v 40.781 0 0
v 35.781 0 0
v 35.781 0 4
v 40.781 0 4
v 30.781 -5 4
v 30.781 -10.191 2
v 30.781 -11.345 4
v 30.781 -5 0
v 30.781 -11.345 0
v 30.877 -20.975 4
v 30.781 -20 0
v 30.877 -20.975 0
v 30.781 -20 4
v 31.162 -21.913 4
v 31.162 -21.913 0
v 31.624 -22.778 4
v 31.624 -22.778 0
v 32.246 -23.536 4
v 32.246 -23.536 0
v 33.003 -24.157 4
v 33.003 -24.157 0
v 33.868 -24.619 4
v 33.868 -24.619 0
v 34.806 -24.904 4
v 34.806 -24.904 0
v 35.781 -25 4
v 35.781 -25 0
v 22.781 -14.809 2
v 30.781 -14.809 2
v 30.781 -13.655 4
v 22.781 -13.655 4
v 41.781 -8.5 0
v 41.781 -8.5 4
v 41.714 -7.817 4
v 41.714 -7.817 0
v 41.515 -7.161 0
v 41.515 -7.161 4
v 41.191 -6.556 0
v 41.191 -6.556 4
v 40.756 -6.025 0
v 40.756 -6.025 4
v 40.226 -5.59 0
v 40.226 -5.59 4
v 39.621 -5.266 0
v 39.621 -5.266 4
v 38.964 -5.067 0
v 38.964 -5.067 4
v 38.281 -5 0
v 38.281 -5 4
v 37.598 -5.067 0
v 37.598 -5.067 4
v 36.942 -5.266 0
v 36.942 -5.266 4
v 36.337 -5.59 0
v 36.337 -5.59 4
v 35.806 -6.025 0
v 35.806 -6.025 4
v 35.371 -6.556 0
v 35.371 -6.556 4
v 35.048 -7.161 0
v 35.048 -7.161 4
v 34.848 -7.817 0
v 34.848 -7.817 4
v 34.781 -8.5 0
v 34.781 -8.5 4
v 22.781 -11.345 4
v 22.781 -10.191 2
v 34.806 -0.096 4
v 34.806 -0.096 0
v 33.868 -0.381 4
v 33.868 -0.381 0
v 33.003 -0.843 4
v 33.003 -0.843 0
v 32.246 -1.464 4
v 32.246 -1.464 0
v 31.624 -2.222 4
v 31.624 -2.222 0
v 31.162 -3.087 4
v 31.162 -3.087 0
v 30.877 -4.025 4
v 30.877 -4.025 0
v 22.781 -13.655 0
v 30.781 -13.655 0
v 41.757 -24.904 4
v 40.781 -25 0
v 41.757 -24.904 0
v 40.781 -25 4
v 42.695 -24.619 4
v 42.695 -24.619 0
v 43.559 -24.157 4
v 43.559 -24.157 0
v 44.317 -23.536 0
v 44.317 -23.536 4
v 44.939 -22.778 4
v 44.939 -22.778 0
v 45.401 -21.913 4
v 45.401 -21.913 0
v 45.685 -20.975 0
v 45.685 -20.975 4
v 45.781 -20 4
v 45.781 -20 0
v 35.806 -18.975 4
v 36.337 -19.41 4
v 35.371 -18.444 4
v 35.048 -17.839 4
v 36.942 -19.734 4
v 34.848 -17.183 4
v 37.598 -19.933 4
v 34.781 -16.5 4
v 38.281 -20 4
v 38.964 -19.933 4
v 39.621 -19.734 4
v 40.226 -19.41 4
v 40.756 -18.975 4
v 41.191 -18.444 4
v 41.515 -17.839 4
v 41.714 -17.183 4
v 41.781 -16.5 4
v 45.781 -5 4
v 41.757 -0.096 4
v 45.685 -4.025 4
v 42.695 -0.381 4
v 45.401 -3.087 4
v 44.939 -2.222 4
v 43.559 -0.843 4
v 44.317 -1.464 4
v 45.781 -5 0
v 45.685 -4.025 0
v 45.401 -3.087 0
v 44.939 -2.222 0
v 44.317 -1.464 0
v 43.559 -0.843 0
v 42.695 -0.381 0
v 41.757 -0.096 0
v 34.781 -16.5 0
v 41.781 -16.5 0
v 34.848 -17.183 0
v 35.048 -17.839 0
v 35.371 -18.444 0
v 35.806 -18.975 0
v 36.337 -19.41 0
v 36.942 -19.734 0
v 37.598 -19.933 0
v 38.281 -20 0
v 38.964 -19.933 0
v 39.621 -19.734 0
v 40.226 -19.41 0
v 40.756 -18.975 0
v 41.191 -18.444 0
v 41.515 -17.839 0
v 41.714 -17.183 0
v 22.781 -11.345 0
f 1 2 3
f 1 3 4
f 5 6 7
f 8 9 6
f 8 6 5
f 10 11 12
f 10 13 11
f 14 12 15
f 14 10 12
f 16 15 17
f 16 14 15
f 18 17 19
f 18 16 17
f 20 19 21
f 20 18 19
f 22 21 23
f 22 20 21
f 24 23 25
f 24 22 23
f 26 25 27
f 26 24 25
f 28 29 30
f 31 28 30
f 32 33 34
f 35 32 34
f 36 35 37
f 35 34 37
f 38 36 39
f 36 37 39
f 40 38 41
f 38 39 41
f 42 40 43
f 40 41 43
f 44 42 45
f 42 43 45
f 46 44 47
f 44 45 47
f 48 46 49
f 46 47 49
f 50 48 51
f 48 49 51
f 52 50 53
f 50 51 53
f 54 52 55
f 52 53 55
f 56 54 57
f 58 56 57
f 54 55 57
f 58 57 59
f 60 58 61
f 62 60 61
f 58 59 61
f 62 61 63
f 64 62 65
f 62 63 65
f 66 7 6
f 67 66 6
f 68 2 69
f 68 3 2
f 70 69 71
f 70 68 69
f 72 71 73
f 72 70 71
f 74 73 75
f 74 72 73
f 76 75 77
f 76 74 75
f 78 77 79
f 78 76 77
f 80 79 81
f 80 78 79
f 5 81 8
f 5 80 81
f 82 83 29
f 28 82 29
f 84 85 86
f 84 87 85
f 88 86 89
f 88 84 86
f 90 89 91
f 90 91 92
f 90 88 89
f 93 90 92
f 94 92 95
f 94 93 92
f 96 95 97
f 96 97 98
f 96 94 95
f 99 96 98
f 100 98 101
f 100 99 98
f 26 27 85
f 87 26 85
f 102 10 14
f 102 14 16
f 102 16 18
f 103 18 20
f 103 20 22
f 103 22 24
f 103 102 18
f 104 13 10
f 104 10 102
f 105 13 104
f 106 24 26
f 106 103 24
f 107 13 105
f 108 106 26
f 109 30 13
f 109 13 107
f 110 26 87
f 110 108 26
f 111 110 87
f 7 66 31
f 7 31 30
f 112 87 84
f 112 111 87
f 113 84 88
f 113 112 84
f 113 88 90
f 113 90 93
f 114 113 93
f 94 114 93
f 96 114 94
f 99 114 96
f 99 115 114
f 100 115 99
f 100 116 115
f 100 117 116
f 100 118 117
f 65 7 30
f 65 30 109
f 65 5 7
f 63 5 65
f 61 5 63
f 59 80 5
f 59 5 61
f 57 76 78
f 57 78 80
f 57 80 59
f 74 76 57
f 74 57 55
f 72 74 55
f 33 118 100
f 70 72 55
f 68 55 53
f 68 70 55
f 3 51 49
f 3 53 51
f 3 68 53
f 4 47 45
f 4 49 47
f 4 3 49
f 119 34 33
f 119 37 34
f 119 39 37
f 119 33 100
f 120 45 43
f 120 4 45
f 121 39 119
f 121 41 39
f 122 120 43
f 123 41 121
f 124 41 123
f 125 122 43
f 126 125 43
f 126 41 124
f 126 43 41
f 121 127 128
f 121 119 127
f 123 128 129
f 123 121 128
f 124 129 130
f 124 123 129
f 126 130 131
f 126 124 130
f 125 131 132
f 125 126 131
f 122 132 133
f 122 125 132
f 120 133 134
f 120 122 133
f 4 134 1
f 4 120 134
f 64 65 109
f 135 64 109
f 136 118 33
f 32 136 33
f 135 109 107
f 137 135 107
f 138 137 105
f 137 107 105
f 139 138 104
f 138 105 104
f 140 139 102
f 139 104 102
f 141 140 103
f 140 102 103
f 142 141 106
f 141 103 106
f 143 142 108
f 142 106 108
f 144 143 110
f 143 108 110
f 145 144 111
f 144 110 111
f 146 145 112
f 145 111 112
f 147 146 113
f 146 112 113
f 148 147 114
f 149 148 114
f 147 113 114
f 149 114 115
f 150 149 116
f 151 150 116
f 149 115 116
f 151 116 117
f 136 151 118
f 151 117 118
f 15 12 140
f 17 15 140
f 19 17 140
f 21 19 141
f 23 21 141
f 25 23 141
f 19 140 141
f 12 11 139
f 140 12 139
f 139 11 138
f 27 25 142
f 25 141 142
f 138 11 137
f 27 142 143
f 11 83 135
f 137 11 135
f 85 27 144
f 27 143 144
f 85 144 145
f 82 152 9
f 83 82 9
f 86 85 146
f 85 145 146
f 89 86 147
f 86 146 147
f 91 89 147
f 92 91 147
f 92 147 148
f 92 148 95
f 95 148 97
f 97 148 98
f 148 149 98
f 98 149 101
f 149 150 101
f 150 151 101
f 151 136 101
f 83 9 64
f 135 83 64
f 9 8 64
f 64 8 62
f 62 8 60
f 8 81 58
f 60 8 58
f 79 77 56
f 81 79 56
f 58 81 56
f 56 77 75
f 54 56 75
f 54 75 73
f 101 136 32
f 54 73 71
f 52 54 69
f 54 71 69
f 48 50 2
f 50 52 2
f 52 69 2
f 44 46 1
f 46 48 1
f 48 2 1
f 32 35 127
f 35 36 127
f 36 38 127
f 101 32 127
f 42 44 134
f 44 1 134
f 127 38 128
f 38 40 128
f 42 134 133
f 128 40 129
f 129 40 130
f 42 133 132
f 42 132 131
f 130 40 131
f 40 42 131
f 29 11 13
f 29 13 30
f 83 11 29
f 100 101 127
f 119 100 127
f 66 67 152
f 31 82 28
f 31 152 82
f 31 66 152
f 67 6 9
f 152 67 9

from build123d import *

# Parameters (mm, degrees)
F0_W     = 15
F0_H     = 25
F1_DEPTH = 4
F3_DEPTH = 8
F5_DEPTH = 4
F6_R     = 5


# Not quite as in the source:
# - a feature names something its author has since deleted; it is built from what else it names


with BuildPart() as f1:
    # F0 (on Top) → F1 (new body)
    with BuildSketch(Plane.XY):
        with Locations((38.2812308715, -12.5)):
            Rectangle(F0_W, F0_H)
    extrude(amount=F1_DEPTH)

    # F2 (on face) → F3 (join)
    with BuildSketch(Plane(origin=(30.7812308715, 0, 0), x_dir=(0, -1, 0), z_dir=(-1, 0, 0))):
        Polygon((13.6547005384, 0), (14.8094010768, 2), (13.6547005384, 4), (11.3452994616, 4), (10.1905989232, 2), (11.3452994616, 0), align=None)
    extrude(amount=F3_DEPTH)

    # F4 (on face) → F5 (cut, through all)
    with BuildSketch(Plane.XY.offset(4)):
        with BuildLine():
            Line((34.7812308715, -16.5), (41.7812308715, -16.5))
            ThreePointArc((41.7812308715, -16.5), (38.2812308715, -13), (34.7812308715, -16.5))
        make_face()
        with BuildLine():
            ThreePointArc((34.7812308715, -16.5), (38.2812308715, -20), (41.7812308715, -16.5))
            Line((41.7812308715, -16.5), (34.7812308715, -16.5))
        make_face()
        with BuildLine():
            ThreePointArc((34.7812308715, -16.5), (38.2812308715, -13), (41.7812308715, -16.5))
            Line((41.7812308715, -16.5), (41.7812308715, -8.5))
            ThreePointArc((41.7812308715, -8.5), (38.2812308715, -12), (34.7812308715, -8.5))
            Line((34.7812308715, -8.5), (34.7812308715, -16.5))
        make_face()
        with BuildLine():
            Line((34.7812308715, -8.5), (41.7812308715, -8.5))
            ThreePointArc((41.7812308715, -8.5), (38.2812308715, -5), (34.7812308715, -8.5))
        make_face()
        with BuildLine():
            ThreePointArc((34.7812308715, -8.5), (38.2812308715, -12), (41.7812308715, -8.5))
            Line((41.7812308715, -8.5), (34.7812308715, -8.5))
        make_face()
    extrude(amount=-F5_DEPTH, mode=Mode.SUBTRACT)

    # F6
    f6_edges = [f1.edges().sort_by_distance(p)[0] for p in [
        (45.781231, 0, 2),
        (30.781231, 0, 2),
        (45.781231, -25, 2),
        (30.781231, -25, 2),
    ]]
    fillet(f6_edges, radius=F6_R)


solid = f1.part
